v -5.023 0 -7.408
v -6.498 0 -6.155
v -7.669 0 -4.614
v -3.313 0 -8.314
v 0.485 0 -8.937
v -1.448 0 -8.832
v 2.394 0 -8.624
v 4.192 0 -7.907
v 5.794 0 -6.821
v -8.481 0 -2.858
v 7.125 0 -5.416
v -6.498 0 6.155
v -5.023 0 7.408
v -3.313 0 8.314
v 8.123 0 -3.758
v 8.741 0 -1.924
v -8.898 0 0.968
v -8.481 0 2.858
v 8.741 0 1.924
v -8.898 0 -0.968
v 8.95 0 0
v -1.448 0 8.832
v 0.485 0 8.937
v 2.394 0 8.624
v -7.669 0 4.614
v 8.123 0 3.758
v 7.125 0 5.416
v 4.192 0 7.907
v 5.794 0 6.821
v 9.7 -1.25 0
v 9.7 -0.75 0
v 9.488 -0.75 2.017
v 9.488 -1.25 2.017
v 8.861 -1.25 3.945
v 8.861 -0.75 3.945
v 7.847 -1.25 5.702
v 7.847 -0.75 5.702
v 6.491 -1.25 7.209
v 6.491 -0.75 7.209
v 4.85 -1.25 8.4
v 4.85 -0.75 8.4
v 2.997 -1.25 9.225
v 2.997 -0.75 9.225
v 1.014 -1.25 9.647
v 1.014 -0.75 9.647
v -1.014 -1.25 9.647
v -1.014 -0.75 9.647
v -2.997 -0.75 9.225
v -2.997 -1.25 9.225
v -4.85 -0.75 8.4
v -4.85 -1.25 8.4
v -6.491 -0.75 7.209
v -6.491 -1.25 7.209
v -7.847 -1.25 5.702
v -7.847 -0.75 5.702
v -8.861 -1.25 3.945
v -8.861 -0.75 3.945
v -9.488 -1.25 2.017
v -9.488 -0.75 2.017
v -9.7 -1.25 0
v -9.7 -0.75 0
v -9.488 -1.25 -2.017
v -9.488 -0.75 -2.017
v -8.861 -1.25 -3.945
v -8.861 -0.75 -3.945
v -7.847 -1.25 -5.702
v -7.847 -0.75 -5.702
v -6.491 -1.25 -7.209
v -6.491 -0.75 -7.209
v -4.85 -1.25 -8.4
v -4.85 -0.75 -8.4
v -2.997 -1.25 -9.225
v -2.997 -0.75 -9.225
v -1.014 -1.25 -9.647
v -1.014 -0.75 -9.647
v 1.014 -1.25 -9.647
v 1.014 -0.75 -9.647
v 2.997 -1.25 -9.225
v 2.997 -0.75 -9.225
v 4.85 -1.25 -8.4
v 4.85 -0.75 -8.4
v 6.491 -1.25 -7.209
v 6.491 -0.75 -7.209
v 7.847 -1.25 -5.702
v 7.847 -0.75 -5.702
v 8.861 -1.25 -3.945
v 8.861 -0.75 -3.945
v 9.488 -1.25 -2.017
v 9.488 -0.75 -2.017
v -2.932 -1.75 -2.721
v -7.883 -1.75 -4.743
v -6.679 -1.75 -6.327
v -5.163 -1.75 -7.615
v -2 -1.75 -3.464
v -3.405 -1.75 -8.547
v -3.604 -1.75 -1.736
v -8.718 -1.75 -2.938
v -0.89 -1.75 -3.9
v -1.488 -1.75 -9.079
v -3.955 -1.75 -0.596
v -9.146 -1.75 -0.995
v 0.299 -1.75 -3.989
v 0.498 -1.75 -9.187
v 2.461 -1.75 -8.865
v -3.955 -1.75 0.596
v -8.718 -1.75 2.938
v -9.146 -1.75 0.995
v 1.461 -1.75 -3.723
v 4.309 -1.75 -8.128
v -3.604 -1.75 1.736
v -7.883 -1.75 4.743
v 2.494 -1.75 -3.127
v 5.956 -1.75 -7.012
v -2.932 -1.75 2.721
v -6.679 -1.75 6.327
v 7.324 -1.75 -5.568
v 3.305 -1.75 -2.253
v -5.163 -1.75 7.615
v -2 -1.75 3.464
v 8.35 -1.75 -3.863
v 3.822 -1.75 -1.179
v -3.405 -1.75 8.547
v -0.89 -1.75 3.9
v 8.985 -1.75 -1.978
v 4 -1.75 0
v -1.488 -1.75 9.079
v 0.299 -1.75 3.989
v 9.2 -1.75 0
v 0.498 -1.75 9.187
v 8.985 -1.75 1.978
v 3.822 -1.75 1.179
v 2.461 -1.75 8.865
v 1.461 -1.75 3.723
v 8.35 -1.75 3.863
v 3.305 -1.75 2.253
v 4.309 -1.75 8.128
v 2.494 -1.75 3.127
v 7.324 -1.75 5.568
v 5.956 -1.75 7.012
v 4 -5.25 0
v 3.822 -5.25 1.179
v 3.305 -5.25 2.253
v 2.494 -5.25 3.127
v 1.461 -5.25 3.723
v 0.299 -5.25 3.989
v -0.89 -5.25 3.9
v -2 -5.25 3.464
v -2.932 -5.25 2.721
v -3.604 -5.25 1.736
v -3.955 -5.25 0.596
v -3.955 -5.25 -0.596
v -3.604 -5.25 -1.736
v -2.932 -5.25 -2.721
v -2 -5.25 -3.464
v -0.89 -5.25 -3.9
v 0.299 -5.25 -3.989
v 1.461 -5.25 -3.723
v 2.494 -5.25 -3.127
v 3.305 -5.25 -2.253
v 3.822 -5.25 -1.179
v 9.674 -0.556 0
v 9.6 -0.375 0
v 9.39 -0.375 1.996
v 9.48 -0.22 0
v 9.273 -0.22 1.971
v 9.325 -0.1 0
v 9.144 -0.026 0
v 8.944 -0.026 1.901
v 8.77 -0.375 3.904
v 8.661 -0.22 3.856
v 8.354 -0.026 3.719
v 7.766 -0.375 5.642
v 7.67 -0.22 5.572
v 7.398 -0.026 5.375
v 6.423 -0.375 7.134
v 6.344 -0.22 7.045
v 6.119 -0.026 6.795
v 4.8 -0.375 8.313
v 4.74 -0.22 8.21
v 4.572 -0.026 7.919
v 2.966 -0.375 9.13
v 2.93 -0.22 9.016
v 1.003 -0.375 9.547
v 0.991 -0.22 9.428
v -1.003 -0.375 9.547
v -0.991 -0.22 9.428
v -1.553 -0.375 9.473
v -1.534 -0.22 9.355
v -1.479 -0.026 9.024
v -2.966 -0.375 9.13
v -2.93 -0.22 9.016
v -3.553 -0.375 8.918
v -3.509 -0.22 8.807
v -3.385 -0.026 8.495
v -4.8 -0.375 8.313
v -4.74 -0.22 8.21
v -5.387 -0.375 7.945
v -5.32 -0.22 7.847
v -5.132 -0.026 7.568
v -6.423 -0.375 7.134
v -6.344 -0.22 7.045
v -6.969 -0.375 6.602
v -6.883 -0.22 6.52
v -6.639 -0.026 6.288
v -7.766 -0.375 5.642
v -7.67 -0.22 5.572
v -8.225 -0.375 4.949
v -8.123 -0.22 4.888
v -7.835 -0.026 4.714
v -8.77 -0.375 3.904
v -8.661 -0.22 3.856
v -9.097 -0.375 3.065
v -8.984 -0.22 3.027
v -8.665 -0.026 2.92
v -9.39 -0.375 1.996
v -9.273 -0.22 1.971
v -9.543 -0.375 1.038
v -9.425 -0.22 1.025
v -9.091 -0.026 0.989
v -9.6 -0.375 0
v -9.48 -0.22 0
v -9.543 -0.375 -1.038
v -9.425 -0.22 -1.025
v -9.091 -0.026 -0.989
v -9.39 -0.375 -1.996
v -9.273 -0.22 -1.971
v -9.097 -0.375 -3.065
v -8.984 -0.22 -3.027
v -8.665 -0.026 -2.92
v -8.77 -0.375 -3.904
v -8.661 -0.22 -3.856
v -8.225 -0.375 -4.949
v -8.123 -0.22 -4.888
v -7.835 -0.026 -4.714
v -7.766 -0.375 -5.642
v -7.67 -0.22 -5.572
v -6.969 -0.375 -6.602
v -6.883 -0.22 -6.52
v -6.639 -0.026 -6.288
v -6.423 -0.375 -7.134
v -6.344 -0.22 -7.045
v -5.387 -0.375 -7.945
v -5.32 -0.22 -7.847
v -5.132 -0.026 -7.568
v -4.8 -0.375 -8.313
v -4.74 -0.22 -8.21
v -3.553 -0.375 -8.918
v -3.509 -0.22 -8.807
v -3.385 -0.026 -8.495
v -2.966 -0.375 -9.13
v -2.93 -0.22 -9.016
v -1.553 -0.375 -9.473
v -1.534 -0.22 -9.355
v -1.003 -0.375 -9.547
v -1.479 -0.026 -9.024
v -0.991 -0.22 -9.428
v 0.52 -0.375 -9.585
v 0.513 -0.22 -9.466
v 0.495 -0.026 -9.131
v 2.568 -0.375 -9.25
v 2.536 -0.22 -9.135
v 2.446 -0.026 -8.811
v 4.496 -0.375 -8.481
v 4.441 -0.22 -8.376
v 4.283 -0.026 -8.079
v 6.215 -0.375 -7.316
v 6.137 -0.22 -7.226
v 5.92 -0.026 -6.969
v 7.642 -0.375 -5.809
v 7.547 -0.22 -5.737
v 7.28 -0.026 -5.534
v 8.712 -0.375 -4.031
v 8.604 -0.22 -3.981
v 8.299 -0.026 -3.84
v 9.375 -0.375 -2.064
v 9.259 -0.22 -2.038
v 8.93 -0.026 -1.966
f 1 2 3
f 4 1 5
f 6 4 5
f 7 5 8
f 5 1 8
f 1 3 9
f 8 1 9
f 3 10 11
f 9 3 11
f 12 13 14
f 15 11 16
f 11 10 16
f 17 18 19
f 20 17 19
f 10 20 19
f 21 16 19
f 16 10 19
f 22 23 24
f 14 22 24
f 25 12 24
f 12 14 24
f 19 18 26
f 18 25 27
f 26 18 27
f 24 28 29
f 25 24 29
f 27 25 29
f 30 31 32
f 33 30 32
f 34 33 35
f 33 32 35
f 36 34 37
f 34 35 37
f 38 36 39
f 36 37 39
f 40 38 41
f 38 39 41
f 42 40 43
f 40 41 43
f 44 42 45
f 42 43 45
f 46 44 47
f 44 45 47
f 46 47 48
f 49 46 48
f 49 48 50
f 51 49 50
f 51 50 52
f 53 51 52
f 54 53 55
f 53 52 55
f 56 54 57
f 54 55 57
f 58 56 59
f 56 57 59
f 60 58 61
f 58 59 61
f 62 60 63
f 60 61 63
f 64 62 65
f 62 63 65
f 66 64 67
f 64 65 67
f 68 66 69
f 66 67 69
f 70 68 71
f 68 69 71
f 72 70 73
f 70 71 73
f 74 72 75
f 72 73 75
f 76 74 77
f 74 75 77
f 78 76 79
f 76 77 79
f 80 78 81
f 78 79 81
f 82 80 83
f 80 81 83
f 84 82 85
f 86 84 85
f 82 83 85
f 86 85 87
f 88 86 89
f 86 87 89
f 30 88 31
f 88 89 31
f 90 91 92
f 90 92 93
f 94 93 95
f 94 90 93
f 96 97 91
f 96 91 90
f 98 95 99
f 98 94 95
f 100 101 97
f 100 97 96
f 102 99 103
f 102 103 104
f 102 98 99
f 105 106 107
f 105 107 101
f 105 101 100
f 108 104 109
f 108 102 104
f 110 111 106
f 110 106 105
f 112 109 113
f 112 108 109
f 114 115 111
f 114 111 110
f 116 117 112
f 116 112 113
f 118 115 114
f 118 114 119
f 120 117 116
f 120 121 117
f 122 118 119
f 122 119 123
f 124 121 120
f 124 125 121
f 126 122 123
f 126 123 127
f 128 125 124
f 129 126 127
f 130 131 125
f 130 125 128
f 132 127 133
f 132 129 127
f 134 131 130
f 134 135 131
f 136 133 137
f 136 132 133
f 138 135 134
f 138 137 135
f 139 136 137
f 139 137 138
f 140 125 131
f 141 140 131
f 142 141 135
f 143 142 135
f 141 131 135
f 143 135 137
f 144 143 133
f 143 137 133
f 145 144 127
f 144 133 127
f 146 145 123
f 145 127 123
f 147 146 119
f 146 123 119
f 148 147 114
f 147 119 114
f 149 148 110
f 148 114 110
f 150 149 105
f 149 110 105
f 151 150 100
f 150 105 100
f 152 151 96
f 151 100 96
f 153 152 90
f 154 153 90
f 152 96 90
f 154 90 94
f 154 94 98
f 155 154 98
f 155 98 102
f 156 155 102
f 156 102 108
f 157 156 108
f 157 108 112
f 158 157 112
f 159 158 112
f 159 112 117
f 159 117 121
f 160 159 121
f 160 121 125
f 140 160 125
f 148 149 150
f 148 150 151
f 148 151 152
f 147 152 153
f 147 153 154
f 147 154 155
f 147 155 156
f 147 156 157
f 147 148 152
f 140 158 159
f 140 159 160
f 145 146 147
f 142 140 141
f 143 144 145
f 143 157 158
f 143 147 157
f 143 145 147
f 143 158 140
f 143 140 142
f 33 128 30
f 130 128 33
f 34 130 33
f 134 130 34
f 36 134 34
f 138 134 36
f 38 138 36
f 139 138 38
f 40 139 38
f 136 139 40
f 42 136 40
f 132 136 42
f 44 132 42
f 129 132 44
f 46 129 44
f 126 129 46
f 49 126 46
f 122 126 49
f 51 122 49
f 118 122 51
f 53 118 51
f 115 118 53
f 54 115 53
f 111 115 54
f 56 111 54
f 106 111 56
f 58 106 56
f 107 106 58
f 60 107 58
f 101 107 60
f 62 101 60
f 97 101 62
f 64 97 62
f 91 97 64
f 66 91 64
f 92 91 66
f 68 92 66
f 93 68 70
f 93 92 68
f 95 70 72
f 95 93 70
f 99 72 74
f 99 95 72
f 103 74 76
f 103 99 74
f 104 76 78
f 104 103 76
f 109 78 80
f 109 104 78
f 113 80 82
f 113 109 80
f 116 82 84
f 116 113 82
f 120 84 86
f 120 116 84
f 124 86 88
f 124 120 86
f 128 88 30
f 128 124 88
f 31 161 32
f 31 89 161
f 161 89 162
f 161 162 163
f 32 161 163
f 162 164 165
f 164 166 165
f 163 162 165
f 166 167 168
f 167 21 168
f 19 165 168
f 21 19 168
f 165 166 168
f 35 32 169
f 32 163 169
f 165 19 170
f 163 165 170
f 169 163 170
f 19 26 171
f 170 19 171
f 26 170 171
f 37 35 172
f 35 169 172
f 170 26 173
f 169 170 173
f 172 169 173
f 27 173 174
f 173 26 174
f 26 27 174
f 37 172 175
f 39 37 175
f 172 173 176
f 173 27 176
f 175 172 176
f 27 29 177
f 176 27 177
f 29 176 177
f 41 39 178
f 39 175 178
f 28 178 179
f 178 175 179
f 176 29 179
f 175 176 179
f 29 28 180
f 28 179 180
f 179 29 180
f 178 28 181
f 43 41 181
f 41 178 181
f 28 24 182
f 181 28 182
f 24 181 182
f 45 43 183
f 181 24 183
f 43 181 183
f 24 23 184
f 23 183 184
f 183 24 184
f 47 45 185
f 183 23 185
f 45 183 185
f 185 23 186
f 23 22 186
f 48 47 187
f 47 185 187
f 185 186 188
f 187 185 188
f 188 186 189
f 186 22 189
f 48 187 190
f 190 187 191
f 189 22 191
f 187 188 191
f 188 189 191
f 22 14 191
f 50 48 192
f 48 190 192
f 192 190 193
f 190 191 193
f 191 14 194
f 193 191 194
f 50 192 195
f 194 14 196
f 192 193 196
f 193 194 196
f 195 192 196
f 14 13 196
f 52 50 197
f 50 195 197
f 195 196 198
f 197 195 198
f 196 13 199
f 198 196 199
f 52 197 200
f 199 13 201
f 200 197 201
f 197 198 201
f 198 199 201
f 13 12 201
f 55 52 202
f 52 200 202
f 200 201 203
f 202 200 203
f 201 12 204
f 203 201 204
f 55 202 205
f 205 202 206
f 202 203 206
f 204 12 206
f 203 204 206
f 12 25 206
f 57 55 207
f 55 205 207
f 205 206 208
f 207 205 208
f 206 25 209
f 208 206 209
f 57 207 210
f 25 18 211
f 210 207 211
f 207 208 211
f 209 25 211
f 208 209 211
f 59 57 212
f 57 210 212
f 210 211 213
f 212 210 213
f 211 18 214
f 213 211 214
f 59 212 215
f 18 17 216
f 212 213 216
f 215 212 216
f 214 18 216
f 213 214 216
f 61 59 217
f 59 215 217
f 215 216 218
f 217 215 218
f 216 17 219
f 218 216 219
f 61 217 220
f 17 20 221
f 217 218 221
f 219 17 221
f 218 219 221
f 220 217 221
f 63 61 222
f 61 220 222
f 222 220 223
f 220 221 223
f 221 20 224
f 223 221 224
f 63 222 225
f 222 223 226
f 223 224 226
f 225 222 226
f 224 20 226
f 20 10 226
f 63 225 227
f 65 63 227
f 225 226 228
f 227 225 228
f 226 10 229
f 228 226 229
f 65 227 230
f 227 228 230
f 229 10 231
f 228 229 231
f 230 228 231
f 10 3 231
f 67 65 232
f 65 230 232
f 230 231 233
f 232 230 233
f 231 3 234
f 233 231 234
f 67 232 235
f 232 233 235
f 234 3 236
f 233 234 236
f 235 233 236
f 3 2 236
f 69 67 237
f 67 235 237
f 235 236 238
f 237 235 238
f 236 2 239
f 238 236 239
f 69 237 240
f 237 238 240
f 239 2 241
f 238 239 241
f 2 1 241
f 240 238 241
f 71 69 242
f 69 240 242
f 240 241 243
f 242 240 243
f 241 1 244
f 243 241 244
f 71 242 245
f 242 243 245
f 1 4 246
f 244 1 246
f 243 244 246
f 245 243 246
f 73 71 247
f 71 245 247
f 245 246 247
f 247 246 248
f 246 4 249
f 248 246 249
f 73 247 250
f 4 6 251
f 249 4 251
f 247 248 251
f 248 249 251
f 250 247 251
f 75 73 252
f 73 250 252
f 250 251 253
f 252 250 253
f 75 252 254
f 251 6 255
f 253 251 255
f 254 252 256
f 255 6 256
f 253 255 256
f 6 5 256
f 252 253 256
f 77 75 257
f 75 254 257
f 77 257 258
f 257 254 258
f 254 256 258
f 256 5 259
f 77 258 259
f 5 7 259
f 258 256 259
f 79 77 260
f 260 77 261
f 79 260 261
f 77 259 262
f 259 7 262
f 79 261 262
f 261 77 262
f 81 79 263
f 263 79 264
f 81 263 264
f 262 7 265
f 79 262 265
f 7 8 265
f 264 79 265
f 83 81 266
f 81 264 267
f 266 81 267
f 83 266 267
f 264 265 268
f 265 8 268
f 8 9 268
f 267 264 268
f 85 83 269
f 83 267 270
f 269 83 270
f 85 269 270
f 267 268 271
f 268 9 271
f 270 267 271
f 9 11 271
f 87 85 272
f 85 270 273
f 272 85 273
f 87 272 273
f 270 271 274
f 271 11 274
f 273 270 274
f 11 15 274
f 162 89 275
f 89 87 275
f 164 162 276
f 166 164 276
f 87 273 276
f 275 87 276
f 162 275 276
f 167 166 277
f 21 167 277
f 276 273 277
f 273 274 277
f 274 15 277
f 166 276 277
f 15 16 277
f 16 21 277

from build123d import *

# Parameters (mm, degrees)
F0_R     = 4
F1_DEPTH = 5.25
F0_R_2   = 9.7
F2_DEPTH = 1.75
F3_SIZE  = 0.5
F4_R     = 0.75


# Not quite as in the source:
# - a feature names something its author has since deleted; it is built from what else it names


with BuildPart() as f1:
    # F0 (on Front) → F1 (new body)
    with BuildSketch(Plane.XZ):
        Circle(F0_R)
    extrude(amount=F1_DEPTH)

    # F0 (on Front) → F2 (join)
    with BuildSketch(Plane.XZ):
        Circle(F0_R_2)
        Circle(F0_R, mode=Mode.SUBTRACT)
    extrude(amount=F2_DEPTH)

    # F3
    f3_edges = [f1.edges().sort_by_distance(p)[0] for p in [
        (-9.7, -1.75, 0),
    ]]
    chamfer(f3_edges, length=F3_SIZE)

    # F4
    f4_edges = [f1.edges().sort_by_distance(p)[0] for p in [
        (-9.7, 0, 0),
    ]]
    fillet(f4_edges, radius=F4_R)


solid = f1.part
